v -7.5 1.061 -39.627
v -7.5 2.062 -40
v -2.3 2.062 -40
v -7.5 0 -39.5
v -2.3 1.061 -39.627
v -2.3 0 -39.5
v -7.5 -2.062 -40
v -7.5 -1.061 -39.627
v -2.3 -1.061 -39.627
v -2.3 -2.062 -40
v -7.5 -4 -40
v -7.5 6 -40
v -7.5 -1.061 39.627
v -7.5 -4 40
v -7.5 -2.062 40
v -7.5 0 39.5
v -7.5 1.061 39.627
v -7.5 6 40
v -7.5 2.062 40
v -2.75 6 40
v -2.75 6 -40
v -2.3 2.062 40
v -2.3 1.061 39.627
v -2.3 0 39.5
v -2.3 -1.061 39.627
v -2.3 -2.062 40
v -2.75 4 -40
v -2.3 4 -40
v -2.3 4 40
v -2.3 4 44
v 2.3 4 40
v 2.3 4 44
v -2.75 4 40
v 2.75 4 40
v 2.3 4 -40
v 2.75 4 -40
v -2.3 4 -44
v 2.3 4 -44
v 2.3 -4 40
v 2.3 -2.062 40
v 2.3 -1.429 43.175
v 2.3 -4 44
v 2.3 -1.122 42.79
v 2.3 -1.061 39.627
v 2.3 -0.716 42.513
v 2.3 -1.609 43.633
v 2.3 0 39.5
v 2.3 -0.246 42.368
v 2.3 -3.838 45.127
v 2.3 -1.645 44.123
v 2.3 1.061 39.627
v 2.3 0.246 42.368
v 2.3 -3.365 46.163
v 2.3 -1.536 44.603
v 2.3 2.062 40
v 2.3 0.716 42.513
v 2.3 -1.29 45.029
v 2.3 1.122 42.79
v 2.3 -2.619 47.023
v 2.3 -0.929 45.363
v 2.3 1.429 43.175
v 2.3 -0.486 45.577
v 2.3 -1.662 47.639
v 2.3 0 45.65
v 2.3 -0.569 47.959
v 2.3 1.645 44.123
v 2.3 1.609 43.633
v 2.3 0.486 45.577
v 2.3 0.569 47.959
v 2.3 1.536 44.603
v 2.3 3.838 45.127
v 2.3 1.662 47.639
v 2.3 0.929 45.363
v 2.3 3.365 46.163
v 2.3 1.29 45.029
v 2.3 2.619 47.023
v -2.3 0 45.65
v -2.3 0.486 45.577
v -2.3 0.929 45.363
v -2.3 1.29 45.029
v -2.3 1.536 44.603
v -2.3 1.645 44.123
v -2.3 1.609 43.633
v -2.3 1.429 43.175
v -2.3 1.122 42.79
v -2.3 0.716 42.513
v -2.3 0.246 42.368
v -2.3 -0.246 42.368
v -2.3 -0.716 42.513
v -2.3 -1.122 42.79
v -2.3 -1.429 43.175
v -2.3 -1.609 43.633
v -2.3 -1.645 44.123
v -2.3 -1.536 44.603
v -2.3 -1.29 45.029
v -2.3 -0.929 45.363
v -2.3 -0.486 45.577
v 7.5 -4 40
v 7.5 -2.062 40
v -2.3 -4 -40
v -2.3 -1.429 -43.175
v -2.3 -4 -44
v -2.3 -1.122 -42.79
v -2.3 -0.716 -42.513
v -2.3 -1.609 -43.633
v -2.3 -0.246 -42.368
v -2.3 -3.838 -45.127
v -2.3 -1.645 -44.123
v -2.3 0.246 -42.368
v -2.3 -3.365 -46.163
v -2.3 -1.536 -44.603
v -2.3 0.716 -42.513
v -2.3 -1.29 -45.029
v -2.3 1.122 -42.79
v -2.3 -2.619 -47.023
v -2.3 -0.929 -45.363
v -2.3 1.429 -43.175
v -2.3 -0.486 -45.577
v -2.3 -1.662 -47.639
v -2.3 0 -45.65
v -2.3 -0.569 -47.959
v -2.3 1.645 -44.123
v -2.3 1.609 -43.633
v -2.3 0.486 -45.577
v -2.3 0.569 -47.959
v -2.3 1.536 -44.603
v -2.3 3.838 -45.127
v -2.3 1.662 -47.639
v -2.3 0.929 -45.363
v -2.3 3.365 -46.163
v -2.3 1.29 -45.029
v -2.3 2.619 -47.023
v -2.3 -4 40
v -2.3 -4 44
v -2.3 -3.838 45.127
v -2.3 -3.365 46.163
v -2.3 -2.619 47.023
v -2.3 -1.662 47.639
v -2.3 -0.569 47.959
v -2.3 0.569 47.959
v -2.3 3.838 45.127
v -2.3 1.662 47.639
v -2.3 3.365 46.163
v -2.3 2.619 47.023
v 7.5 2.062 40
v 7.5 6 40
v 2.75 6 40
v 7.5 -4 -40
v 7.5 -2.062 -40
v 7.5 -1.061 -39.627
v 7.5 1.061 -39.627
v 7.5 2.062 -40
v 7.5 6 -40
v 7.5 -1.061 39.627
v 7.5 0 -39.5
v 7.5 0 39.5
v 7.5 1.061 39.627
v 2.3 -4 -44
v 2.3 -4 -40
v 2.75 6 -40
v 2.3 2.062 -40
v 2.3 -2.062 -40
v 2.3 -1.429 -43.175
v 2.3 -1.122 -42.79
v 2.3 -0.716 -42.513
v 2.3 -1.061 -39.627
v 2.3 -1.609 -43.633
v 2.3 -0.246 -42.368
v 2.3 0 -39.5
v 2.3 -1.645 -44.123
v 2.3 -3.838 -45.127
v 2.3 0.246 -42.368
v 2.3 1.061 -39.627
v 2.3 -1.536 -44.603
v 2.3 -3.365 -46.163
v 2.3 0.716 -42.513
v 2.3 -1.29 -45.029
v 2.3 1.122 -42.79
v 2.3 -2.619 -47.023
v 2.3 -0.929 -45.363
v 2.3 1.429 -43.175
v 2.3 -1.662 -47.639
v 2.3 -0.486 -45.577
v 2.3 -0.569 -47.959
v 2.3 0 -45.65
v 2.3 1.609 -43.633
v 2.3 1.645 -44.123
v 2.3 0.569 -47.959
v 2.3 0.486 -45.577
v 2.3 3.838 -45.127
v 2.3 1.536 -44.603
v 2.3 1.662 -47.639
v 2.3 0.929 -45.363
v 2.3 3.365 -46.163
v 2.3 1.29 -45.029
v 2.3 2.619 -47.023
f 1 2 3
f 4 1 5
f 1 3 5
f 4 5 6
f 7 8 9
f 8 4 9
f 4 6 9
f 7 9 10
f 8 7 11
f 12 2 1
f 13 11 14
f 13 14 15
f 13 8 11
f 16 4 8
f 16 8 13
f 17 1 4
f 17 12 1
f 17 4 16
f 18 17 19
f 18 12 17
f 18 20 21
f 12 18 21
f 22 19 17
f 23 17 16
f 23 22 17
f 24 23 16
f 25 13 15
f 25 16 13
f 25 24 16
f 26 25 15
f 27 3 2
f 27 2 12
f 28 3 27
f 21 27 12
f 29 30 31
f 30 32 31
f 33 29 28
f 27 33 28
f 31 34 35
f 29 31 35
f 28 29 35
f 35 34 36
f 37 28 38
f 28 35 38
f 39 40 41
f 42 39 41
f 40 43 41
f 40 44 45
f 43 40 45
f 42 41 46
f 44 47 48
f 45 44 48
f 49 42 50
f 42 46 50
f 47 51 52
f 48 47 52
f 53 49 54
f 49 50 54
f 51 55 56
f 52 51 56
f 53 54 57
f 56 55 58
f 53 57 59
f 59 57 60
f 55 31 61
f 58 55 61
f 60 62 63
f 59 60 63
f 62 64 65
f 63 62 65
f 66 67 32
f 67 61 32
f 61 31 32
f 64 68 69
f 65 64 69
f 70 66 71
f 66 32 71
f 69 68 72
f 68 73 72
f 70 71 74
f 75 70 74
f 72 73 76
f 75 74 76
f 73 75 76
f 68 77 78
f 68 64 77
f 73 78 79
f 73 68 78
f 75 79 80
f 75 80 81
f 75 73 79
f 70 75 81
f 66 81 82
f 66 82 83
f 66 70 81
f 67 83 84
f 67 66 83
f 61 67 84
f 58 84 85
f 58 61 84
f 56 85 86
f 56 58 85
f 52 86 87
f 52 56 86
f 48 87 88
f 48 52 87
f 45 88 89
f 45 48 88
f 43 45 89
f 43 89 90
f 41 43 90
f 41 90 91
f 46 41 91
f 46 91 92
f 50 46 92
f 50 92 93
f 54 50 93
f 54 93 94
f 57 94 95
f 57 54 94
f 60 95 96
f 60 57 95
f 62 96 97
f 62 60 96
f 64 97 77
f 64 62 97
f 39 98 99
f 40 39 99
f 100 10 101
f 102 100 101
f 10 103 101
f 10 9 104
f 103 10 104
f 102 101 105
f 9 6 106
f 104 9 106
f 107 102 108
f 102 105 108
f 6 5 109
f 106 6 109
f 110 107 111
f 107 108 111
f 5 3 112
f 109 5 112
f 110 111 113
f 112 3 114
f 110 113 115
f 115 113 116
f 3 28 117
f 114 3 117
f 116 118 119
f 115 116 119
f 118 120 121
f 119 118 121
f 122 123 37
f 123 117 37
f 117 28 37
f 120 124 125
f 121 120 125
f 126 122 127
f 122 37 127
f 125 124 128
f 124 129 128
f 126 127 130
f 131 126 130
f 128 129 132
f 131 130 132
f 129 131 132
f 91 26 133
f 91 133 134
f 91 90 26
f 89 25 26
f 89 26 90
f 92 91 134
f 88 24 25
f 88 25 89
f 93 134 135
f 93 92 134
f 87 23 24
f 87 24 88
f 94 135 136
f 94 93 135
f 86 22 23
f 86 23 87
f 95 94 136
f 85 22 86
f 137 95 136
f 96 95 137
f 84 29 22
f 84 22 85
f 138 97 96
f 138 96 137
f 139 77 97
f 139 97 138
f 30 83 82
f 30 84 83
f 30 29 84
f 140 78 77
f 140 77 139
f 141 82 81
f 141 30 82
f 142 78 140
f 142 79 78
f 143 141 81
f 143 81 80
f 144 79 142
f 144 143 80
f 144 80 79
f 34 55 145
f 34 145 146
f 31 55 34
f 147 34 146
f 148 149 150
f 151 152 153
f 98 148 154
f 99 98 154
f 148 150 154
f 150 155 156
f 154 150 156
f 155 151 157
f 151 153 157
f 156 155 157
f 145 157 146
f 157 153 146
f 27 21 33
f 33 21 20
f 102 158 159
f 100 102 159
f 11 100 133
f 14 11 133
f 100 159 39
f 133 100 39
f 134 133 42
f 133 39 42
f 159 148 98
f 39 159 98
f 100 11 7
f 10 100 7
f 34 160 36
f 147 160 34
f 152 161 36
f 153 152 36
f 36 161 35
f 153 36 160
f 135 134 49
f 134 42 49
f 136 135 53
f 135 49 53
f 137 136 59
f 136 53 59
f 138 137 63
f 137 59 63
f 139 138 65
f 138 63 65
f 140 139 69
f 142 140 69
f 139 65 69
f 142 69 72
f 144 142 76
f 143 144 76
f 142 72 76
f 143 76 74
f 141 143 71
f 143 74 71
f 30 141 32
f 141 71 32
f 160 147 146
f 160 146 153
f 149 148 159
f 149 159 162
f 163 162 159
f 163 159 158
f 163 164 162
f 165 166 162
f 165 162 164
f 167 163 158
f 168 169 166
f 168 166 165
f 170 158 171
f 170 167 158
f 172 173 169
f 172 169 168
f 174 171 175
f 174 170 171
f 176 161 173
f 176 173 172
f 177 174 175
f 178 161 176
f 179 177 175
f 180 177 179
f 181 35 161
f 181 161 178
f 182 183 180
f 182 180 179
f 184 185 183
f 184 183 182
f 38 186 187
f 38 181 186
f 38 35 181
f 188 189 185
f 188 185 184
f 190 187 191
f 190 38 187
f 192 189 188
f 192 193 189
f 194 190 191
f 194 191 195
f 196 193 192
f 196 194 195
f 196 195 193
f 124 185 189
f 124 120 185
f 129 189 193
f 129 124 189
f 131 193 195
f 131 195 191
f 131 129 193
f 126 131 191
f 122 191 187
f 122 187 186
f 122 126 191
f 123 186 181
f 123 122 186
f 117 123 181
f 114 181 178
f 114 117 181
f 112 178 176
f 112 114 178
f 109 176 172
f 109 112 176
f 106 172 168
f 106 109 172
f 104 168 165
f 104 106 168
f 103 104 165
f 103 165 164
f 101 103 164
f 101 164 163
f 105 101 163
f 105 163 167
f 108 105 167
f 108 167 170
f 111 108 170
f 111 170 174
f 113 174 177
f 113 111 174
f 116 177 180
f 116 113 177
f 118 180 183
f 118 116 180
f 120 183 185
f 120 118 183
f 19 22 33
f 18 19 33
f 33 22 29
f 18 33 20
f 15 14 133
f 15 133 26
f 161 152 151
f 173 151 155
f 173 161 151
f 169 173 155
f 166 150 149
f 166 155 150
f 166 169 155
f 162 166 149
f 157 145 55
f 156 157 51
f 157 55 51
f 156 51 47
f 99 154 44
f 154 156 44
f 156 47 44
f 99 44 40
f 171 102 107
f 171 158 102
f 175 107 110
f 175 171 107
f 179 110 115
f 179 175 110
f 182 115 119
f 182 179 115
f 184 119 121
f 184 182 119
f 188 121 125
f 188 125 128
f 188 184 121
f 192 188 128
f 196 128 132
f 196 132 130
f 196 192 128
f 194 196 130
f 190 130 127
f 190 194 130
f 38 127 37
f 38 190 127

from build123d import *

# Parameters (mm, degrees)
SKETCH1_W           = 40
SKETCH1_H           = 8
SKETCH1_W_2         = 4
BOSS_EXTRUDE1_DEPTH = 7.5
BOSS_EXTRUDE2_START = 2.75
SKETCH1_5_W         = 40
SKETCH1_5_H         = 8
SKETCH1_5_H_2       = 2
SKETCH1_5_W_2       = 4
BOSS_EXTRUDE2_DEPTH = 4.75
SKETCH1_7_R         = 1.65
BOSS_EXTRUDE3_DEPTH = 2.3
CUT_EXTRUDE3_START  = 2.3
SKETCH3_R           = 4.5
CUT_EXTRUDE3_DEPTH  = 47.651506616


with BuildPart() as part:
    # Sketch1 → Boss-Extrude1 (new body)
    with BuildSketch(Plane(origin=(0, 0, 0), x_dir=(0, 0, -1), z_dir=(1, 0, 0))):
        with Locations((20, 0)):
            Rectangle(SKETCH1_W, SKETCH1_H)
        with Locations((38, 0)):
            Rectangle(SKETCH1_W_2, SKETCH1_H)
    extrude(amount=BOSS_EXTRUDE1_DEPTH)

    # Sketch1<5> → Boss-Extrude2 (add)
    with BuildSketch(Plane(origin=(0, 0, 0), x_dir=(0, 0, -1), z_dir=(1, 0, 0)).offset(BOSS_EXTRUDE2_START)):
        with Locations((20, 0)):
            Rectangle(SKETCH1_5_W, SKETCH1_5_H)
        with Locations((20, 5)):
            Rectangle(SKETCH1_5_W, SKETCH1_5_H_2)
        with Locations((38, 0)):
            Rectangle(SKETCH1_5_W_2, SKETCH1_5_H)
        with Locations((38, 5)):
            Rectangle(SKETCH1_5_W_2, SKETCH1_5_H_2)
    extrude(amount=BOSS_EXTRUDE2_DEPTH)

    # Sketch1<7> → Boss-Extrude3 (add)
    with BuildSketch(Plane(origin=(0, 0, 0), x_dir=(0, 0, -1), z_dir=(1, 0, 0))):
        with BuildLine():
            Line((44, 4), (40, 4))
            Line((40, 4), (40, -4))
            Line((40, -4), (44, -4))
            ThreePointArc((44, -4), (48, 0), (44, 4))
        make_face()
        with Locations((44, 0)):
            Circle(SKETCH1_7_R, mode=Mode.SUBTRACT)
    extrude(amount=BOSS_EXTRUDE3_DEPTH)

    # Sketch3 → Cut-Extrude3 (cut, through all)
    with BuildSketch(Plane(origin=(0, 0, 0), x_dir=(0, 0, -1), z_dir=(1, 0, 0)).offset(CUT_EXTRUDE3_START)):
        with Locations((44, 0)):
            Circle(SKETCH3_R)
    extrude(amount=CUT_EXTRUDE3_DEPTH, mode=Mode.SUBTRACT)

    # Mirror1: part across plane


with BuildPart() as part_1:
    add(part.part)
    add(part.part.mirror(Plane(origin=(0, 0, 0), x_dir=(0, 0, 1), z_dir=(1, 0, 0))))

    # Mirror2: part across plane


with BuildPart() as part_2:
    add(part_1.part)
    add(part_1.part.mirror(Plane.XY))


solid = part_2.part
